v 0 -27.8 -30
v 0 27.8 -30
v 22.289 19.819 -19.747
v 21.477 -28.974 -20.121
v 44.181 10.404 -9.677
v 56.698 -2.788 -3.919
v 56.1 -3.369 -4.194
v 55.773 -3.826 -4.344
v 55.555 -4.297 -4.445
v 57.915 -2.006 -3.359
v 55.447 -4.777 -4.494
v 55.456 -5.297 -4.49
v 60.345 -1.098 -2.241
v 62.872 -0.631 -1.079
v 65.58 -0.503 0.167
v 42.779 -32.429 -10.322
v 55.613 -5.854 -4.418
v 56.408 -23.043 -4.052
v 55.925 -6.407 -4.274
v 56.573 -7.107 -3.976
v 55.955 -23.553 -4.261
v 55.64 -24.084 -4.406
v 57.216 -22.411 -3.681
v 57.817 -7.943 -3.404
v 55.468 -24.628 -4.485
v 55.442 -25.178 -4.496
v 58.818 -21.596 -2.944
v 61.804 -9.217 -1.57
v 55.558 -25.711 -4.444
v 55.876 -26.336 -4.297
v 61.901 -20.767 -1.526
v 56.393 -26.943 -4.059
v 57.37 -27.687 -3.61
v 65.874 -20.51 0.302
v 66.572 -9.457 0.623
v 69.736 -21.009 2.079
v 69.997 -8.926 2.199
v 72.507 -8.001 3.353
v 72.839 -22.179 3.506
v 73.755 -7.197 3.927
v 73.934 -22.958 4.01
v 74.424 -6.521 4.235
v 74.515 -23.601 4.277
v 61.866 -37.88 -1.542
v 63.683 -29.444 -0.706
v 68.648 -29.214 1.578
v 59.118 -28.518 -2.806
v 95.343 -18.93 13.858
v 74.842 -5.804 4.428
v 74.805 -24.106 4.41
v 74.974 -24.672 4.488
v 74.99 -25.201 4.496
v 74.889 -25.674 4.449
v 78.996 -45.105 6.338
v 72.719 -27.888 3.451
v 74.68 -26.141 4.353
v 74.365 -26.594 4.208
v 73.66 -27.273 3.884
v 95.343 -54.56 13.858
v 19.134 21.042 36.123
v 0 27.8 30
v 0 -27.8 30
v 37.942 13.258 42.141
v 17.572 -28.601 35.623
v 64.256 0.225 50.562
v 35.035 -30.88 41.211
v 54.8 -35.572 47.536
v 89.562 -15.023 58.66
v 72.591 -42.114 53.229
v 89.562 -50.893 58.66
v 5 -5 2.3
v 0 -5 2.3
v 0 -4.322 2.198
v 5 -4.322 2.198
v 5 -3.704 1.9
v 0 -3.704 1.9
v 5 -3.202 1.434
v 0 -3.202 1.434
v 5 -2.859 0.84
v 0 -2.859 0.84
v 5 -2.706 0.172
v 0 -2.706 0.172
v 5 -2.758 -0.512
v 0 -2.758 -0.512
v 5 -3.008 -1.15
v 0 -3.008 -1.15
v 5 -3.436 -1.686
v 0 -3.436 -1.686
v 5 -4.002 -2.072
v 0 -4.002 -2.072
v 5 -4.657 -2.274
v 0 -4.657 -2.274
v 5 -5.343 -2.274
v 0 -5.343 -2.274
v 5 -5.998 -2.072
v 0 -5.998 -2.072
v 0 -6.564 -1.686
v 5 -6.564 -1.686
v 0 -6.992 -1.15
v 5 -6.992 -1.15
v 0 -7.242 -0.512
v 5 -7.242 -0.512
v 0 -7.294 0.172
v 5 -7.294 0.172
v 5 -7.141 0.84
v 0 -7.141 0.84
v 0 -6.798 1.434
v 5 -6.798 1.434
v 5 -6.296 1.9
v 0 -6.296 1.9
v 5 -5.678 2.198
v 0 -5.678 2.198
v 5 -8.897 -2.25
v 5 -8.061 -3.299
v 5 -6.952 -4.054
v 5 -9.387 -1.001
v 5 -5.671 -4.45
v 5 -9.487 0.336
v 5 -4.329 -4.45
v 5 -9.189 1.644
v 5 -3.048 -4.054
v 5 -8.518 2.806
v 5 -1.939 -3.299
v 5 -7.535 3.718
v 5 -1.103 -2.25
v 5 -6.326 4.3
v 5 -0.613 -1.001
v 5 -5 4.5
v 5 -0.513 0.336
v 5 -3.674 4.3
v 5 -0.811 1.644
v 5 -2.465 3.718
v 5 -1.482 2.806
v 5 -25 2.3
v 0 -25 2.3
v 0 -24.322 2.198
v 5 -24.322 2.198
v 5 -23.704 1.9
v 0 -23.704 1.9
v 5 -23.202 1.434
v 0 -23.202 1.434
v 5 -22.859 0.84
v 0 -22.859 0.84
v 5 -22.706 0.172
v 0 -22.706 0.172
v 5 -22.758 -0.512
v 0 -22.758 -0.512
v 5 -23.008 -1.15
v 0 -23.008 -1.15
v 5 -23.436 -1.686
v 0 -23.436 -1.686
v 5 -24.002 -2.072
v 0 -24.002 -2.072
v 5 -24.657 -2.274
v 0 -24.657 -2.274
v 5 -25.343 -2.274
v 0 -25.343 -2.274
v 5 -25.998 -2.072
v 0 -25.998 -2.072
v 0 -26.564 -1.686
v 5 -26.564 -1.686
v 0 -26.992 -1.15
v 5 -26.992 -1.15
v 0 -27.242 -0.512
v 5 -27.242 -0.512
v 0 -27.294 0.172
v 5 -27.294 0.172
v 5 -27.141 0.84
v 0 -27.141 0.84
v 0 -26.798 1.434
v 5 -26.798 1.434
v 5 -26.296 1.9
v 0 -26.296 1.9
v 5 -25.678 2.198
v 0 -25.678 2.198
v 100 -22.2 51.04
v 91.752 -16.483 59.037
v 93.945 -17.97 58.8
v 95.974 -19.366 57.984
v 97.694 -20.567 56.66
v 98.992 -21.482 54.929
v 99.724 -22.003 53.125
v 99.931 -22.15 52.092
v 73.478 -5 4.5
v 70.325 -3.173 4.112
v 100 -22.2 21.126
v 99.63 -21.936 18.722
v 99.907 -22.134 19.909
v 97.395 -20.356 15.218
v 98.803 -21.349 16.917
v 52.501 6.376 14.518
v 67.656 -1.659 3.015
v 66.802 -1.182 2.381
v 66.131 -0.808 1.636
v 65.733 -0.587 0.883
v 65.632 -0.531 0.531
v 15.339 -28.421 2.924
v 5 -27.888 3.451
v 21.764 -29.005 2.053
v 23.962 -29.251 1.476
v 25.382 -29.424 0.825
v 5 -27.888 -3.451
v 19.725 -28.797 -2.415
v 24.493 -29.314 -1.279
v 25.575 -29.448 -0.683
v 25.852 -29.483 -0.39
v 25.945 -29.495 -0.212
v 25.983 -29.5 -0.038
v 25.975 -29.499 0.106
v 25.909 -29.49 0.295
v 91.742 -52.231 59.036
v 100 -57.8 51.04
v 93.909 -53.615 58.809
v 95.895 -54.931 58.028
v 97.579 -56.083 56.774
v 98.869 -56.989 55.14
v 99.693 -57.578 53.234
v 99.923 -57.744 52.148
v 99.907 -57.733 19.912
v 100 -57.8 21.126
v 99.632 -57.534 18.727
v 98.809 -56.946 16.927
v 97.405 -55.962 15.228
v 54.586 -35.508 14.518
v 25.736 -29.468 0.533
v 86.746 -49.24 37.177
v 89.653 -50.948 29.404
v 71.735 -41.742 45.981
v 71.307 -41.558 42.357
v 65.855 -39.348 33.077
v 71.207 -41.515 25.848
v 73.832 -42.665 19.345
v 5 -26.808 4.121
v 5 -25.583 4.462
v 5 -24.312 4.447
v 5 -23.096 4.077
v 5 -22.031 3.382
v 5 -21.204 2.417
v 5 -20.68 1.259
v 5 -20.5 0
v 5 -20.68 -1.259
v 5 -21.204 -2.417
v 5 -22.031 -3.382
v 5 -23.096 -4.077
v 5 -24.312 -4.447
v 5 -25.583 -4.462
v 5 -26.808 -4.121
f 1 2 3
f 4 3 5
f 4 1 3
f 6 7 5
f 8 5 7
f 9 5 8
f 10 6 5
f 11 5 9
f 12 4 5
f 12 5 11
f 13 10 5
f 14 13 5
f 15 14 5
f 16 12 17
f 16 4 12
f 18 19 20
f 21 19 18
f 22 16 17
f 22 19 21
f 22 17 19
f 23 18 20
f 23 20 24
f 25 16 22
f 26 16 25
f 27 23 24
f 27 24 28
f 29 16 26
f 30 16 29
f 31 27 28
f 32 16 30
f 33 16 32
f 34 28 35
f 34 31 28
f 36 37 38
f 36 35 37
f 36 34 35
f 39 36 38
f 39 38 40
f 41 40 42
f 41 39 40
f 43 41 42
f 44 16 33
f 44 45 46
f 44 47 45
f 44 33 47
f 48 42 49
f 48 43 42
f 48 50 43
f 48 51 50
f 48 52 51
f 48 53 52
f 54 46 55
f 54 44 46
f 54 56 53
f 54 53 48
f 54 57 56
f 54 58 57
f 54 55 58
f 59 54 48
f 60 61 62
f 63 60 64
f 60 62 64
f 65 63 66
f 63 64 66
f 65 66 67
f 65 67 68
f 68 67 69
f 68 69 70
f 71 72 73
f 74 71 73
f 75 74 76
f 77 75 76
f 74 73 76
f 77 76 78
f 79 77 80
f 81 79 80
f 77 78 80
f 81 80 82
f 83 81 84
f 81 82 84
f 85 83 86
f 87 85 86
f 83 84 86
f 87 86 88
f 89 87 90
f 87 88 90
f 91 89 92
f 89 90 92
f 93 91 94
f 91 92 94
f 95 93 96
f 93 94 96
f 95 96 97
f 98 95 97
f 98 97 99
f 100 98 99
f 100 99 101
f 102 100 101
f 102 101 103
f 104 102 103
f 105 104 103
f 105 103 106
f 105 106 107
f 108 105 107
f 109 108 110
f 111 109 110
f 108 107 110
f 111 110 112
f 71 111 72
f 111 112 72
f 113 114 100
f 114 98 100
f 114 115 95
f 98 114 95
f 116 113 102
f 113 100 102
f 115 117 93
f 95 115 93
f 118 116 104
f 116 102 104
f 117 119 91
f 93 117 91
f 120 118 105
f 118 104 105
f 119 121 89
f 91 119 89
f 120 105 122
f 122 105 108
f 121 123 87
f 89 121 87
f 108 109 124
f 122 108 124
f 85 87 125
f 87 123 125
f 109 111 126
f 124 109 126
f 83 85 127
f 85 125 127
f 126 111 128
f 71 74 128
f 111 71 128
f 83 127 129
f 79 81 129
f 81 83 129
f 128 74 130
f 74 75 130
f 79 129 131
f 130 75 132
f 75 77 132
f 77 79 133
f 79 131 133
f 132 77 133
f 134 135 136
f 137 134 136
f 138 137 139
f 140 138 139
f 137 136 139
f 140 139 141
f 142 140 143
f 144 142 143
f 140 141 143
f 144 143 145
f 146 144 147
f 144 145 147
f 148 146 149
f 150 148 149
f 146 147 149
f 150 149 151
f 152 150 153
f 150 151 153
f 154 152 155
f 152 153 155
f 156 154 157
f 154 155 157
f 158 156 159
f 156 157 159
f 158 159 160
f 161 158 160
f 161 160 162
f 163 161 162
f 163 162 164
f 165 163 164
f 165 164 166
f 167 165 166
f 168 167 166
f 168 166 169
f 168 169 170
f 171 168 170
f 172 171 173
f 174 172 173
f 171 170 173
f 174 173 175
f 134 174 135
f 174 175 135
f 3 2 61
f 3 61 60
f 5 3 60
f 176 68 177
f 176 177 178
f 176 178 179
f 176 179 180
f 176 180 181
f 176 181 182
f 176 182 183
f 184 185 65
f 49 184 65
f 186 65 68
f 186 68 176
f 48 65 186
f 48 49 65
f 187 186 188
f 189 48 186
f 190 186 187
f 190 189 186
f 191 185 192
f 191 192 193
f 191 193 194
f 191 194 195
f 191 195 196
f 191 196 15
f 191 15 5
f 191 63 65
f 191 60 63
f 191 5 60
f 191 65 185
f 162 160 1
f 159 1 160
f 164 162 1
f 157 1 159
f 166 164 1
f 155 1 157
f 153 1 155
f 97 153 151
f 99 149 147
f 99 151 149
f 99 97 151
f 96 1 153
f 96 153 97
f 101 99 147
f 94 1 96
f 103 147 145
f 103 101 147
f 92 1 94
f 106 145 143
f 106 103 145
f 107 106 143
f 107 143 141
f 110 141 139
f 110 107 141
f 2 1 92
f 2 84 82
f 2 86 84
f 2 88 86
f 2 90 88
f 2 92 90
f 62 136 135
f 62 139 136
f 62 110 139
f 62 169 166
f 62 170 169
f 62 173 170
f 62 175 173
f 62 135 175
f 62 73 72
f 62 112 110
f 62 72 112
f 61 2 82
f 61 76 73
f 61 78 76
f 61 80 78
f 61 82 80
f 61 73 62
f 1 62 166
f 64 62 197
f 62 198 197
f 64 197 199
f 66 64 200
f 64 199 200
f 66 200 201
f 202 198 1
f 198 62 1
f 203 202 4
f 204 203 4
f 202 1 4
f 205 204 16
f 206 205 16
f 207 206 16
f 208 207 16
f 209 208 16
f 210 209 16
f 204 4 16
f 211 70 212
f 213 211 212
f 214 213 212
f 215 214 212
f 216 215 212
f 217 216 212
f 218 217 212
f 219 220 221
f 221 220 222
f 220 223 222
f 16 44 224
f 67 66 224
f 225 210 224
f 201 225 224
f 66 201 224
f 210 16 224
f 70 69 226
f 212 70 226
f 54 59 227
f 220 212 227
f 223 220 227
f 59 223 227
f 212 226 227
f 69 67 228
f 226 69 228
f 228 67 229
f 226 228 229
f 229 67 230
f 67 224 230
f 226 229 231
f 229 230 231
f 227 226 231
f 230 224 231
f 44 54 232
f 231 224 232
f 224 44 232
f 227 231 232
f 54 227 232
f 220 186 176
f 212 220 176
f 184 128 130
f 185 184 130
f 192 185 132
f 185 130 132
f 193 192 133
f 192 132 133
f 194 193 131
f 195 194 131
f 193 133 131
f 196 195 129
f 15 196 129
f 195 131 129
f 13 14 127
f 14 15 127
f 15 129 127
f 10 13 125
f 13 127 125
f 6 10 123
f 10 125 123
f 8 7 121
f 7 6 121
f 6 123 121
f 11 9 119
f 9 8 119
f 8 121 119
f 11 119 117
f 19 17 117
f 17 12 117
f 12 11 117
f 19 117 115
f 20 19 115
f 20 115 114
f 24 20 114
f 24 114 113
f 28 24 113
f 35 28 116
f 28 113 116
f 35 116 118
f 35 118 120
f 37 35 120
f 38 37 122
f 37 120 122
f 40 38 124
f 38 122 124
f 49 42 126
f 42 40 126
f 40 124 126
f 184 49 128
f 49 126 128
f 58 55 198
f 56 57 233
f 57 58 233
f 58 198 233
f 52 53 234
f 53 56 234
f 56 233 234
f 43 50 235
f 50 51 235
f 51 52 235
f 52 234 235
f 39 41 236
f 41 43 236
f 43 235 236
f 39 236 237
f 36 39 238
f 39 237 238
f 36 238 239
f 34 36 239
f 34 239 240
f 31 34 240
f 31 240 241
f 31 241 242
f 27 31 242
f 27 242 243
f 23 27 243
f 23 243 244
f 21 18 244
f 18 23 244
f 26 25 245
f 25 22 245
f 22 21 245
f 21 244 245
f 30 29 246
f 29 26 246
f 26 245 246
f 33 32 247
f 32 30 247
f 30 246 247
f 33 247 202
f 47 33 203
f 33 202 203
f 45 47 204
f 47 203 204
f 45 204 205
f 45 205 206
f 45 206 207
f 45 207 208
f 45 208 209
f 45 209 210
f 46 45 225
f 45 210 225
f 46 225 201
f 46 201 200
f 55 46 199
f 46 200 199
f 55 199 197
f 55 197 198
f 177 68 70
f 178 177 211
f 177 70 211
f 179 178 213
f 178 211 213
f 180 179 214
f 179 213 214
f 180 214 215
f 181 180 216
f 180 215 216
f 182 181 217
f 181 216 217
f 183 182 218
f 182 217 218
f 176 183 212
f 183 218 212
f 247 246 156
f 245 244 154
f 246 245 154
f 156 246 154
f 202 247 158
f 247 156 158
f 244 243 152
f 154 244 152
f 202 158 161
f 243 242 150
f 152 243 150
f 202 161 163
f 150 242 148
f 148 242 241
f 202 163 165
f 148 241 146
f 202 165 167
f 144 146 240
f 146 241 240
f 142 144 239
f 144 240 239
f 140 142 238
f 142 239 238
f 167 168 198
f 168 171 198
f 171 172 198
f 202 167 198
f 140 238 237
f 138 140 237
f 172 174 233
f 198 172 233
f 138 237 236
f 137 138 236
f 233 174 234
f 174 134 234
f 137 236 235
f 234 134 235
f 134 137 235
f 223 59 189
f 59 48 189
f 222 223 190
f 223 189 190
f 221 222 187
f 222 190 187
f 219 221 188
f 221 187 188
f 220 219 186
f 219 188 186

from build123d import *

# Parameters (mm, degrees)
BOSS_EXTRUDE1_DEPTH     = 100
CUT_EXTRUDE3_DEPTH      = 150
CUT_EXTRUDE3_DEPTH_BACK = 150
CUT_EXTRUDE6_DEPTH      = 150
CUT_EXTRUDE6_DEPTH_BACK = 150
FILLET7_R               = 8
SKETCH5_R               = 2.3
CUT_EXTRUDE7_DEPTH      = 5
SKETCH6_R               = 4.5
CUT_EXTRUDE8_DEPTH      = 150


with BuildPart() as part:
    # Sketch1 → Boss-Extrude1 (new body)
    with BuildSketch(Plane(origin=(0, 0, 0), x_dir=(0, 0, -1), z_dir=(1, 0, 0))):
        Polygon((-30, 27.8), (30, 27.8), (30, -27.8), (30, -57.8), (-62, -57.8), (-62, -27.8), (-62, 27.8), align=None)
    extrude(amount=BOSS_EXTRUDE1_DEPTH)

    # Sketch3 → Cut-Extrude3 (cut, two sides: drawn at the far end of the back side and taken through both)
    with BuildSketch(Plane(origin=(0, 0, 0), x_dir=(1, 0, 0), z_dir=(0, 1, 0)).offset(-CUT_EXTRUDE3_DEPTH_BACK)):
        Polygon((0, 30), (100, -16), (100, 30), align=None)
        Polygon((100, -62), (0, -62), (0, -30), align=None)
    extrude(amount=CUT_EXTRUDE3_DEPTH + CUT_EXTRUDE3_DEPTH_BACK, mode=Mode.SUBTRACT)

    # Sketch4 → Cut-Extrude6 (cut, two sides: drawn at the far end of the back side and taken through both)
    with BuildSketch(Plane.XY.offset(-CUT_EXTRUDE6_DEPTH_BACK)):
        with BuildLine():
            Line((100, 27.8), (0, 27.8))
            add(Edge.make_bspline(
                [(0, 27.8), (55.001263305, 9.951718706), (100, -22.2)],
                knots=[0, 0, 0, 0.534302679, 0.534302679, 0.534302679], degree=2))
            Line((100, -22.2), (100, 27.8))
        make_face()
        with BuildLine():
            Line((0, -27.8), (0, -57.8))
            Line((0, -57.8), (100, -57.8))
            add(Edge.make_bspline(
                [(0, -27.8), (59.172869478, -28.215423473), (100, -57.8)],
                knots=[0, 0, 0, 0.618763152, 0.618763152, 0.618763152], degree=2))
        make_face()
    extrude(amount=CUT_EXTRUDE6_DEPTH + CUT_EXTRUDE6_DEPTH_BACK, mode=Mode.SUBTRACT)

    # Fillet7
    fillet7_edges = [part.edges().sort_by_distance(p)[0] for p in [
        (100, -40, 62),
        (100, -40, 16),
    ]]
    fillet(fillet7_edges, radius=FILLET7_R)

    # Sketch5 → Cut-Extrude7 (cut)
    with BuildSketch(Plane.ZY):
        with Locations((0, -5)):
            Circle(SKETCH5_R)
        with Locations((0, -25)):
            Circle(SKETCH5_R)
    extrude(amount=-CUT_EXTRUDE7_DEPTH, mode=Mode.SUBTRACT)

    # Sketch6 → Cut-Extrude8 (cut)
    with BuildSketch(Plane.ZY.offset(-5)):
        with Locations((0, -5)):
            Circle(SKETCH6_R)
        with Locations(Location((0, -25, 0), (0, 0, 320.073904161))):
            Circle(SKETCH6_R)
    extrude(amount=-CUT_EXTRUDE8_DEPTH, mode=Mode.SUBTRACT)


solid = part.part
